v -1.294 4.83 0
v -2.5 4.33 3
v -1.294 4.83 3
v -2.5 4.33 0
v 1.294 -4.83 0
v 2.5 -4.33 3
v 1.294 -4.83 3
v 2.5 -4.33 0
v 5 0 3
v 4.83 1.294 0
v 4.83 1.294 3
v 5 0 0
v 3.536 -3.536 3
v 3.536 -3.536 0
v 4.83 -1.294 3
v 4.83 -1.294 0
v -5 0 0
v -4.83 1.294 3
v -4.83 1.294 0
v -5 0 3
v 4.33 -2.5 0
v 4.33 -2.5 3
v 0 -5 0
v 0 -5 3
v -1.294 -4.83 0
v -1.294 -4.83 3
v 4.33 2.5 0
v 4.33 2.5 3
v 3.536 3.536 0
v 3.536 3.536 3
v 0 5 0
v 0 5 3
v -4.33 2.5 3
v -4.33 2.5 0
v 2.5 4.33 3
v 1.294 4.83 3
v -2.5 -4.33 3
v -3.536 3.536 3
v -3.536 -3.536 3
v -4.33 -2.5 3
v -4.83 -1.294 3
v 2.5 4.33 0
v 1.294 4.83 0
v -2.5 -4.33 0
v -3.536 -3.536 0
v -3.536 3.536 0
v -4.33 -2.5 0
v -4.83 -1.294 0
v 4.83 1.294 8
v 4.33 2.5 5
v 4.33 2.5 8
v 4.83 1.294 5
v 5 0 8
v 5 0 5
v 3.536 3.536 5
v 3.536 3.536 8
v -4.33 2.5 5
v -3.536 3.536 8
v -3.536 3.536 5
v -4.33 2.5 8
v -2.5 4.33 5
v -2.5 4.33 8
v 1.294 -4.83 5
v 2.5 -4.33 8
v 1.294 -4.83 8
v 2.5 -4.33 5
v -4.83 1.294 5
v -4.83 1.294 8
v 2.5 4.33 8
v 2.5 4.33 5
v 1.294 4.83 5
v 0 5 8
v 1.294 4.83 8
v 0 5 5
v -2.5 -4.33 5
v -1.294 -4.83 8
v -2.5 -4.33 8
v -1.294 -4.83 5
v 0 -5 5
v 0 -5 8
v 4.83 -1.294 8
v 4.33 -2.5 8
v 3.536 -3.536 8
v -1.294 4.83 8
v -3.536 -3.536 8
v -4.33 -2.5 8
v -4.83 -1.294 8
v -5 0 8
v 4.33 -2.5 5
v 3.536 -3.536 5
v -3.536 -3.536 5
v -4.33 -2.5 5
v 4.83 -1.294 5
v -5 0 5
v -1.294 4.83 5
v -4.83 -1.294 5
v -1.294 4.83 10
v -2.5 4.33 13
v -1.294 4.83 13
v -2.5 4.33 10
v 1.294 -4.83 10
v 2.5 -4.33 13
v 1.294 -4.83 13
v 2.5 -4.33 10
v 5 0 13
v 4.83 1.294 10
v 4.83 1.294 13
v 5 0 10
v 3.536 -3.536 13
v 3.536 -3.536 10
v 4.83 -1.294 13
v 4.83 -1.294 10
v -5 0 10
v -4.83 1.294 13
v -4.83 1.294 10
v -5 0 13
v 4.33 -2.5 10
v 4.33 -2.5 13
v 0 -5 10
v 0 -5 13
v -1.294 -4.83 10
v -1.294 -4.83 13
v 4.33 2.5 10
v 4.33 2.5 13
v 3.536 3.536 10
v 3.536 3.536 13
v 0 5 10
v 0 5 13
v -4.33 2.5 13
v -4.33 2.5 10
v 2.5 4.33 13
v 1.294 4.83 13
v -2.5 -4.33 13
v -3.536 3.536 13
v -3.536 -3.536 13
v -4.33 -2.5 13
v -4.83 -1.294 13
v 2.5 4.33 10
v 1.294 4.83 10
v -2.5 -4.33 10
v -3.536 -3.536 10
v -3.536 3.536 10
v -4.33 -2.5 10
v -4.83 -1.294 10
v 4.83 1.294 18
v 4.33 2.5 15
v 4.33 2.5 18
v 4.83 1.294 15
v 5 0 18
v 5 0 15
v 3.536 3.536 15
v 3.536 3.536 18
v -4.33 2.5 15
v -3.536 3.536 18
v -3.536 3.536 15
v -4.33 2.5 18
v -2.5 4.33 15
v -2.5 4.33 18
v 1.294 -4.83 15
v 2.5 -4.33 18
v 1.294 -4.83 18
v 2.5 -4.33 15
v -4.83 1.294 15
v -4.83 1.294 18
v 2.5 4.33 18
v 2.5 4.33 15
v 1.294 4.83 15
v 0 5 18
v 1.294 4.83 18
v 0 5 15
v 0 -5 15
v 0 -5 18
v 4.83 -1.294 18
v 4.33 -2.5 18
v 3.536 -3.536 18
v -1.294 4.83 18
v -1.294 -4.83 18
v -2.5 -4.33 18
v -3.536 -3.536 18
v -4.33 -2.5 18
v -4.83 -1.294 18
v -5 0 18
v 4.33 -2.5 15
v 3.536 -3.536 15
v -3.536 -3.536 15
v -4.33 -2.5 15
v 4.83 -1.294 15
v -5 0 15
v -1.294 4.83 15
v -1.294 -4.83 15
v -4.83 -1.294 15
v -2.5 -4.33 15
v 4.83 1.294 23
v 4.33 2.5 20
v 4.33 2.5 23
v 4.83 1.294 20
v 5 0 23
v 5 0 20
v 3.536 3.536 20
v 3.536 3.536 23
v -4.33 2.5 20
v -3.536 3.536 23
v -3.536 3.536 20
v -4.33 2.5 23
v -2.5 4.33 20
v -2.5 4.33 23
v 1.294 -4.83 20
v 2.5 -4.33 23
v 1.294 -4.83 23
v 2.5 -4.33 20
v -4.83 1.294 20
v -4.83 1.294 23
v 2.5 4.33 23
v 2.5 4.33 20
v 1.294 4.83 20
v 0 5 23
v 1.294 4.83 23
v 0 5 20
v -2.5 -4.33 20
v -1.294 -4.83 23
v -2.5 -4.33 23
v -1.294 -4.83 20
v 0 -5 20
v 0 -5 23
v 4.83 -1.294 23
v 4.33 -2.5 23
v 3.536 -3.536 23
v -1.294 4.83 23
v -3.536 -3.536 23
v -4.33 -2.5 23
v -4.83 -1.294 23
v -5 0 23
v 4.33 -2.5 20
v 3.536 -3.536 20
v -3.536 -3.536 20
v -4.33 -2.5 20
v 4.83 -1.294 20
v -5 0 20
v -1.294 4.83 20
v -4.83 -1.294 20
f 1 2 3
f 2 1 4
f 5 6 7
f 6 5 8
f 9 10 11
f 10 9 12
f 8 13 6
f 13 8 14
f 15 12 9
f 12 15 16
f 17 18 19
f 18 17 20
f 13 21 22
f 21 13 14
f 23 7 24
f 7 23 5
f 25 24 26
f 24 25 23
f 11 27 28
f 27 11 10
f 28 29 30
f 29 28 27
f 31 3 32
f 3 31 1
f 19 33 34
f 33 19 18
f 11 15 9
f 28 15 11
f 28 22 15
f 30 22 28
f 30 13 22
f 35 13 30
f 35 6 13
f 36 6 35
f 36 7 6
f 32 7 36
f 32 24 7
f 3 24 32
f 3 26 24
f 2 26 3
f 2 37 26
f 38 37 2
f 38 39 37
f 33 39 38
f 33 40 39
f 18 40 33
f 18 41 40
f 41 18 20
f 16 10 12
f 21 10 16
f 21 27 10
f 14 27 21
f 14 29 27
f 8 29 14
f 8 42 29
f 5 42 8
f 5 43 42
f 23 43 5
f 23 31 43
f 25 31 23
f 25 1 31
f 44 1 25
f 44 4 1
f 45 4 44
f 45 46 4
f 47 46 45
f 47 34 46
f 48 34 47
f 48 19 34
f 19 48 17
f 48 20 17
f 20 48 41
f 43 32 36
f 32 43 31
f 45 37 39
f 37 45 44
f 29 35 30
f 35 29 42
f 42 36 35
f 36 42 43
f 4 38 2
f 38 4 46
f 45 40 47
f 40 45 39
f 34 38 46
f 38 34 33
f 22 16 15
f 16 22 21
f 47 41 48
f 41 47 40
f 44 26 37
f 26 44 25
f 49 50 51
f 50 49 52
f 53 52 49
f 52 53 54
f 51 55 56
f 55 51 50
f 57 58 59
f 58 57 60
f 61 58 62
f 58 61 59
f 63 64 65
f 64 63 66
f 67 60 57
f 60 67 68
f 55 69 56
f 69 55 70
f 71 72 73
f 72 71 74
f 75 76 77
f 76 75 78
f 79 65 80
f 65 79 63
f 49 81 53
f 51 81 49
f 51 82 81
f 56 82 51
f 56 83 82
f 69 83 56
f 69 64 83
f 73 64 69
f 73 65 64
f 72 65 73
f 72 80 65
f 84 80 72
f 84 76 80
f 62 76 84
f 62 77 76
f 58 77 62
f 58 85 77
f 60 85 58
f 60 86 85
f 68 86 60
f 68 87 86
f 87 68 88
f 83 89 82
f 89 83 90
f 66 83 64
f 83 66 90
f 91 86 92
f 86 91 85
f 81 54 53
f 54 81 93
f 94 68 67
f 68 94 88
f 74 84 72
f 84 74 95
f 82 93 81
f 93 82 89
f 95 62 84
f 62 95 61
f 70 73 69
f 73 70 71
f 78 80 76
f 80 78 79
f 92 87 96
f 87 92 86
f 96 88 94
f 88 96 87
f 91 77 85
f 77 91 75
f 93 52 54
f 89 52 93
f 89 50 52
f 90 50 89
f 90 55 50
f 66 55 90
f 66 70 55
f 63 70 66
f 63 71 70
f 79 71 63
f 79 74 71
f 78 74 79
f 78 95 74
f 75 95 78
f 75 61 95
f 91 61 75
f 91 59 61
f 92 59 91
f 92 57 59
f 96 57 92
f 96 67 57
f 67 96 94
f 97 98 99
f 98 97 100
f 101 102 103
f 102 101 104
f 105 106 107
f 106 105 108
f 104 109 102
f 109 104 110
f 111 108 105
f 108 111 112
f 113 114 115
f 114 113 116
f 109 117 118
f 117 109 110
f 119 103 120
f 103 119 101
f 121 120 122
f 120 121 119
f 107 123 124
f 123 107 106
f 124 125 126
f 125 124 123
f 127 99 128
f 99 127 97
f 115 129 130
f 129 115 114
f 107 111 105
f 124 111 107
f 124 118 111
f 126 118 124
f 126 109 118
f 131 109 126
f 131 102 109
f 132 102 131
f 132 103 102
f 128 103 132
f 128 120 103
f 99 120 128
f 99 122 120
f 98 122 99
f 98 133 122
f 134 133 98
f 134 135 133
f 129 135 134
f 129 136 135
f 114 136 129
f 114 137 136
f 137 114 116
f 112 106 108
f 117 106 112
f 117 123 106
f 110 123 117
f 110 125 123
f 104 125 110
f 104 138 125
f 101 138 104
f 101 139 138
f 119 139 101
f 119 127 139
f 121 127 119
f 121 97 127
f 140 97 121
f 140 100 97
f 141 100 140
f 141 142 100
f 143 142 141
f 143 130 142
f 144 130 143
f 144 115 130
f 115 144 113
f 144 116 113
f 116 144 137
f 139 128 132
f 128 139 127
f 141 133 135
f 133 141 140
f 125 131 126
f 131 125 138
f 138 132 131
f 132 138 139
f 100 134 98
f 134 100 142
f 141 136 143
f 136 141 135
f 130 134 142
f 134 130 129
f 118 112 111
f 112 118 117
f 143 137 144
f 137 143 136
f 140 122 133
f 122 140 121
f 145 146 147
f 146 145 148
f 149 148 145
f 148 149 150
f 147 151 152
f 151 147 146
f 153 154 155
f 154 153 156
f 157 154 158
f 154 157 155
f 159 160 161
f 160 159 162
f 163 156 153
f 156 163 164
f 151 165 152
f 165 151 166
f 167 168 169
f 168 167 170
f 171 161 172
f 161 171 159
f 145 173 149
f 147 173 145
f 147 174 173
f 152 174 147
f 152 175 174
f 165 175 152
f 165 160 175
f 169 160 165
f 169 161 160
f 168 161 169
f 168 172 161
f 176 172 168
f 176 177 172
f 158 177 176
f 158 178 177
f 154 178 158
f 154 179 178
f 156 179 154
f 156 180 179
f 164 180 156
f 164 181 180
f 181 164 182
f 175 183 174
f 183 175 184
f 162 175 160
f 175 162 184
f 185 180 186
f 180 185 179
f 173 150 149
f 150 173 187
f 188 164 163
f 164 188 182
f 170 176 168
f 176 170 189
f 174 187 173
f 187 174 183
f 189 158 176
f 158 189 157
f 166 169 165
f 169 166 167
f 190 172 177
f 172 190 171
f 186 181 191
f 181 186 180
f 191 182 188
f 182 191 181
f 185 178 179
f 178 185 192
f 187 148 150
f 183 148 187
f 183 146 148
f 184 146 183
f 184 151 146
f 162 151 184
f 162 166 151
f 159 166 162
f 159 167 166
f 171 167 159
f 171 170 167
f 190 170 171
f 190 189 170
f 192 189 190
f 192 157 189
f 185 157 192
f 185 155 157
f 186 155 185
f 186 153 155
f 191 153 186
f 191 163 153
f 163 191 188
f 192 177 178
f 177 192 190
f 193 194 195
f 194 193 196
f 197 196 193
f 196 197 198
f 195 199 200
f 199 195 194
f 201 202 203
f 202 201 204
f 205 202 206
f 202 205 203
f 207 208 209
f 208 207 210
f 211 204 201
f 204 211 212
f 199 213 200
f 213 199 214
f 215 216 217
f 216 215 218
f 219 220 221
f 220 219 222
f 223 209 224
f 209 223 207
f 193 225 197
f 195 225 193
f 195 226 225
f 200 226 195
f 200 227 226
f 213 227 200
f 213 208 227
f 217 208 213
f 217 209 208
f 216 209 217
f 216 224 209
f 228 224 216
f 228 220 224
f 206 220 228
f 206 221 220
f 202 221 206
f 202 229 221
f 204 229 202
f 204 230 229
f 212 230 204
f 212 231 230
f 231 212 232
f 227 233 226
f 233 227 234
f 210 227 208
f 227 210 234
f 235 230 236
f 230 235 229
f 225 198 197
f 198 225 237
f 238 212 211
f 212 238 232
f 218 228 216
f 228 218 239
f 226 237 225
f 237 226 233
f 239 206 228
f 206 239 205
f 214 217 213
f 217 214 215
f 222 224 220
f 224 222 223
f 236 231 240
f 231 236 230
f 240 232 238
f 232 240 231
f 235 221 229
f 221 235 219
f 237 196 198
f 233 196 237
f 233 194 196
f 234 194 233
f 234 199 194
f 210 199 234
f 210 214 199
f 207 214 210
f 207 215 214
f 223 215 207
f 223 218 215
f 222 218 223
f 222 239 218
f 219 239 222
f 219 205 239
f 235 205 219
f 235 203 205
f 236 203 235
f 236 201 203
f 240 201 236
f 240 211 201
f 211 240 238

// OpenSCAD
// Construct: for-loop over a range with an explicit step.
for (z = [0 : 5 : 20]) {
    translate([0, 0, z]) cylinder(h = 3, r = 5, $fn = 24);
}
